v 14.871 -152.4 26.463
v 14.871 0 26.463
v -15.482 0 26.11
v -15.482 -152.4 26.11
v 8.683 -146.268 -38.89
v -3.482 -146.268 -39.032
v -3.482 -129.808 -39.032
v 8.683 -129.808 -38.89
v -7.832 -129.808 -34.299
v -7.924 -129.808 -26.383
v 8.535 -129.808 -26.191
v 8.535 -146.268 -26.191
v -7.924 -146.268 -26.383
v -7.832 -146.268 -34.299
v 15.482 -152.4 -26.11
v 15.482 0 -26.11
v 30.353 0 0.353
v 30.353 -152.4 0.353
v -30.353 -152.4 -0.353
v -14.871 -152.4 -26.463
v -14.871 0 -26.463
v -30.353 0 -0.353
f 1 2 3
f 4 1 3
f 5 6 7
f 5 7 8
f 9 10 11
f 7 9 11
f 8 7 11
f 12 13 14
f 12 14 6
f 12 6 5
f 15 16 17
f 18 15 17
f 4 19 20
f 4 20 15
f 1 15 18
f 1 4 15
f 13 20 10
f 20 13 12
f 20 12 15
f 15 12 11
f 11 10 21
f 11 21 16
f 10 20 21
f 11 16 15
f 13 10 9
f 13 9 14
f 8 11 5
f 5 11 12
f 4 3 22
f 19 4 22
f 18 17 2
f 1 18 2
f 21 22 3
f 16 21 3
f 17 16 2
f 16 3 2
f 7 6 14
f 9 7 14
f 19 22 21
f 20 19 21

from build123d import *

# Parameters (mm, degrees)
F1_DEPTH = 152.4
F2_W     = 16.4605937898
F2_H     = 16.4605937898
F3_DEPTH = 12.7
F5_DEPTH = 25.4


with BuildPart() as f1:
    # F0 (on Front) → F1 (new body)
    with BuildSketch(Plane.XZ):
        Polygon((15.4824422158, -26.1103501737), (30.3534476601, 0.3530131847), (14.8710054442, 26.4633633584), (-15.4824422158, 26.1103501737), (-30.3534476601, -0.3530131847), (-14.8710054442, -26.4633633584), align=None)
    extrude(amount=F1_DEPTH)

    # F2 (on face) → F3 (join)
    with BuildSketch(Plane(origin=(0.3057183858, 0, -26.2868567661), x_dir=(0.9999323774, 0, 0.0116292988), z_dir=(0.0116292988, 0, -0.9999323774))):
        with Locations((0, 138.0381435156)):
            Rectangle(F2_W, F2_H)
    extrude(amount=F3_DEPTH)

    # F4 (on face) → F5 (cut)
    with BuildSketch(Plane.XZ.offset(146.2684404105)):
        Polygon((-3.4819418117, -39.031766442), (-7.8319489835, -34.2993618355), (-7.7763298602, -39.0817105412), align=None)
    extrude(amount=-F5_DEPTH, mode=Mode.SUBTRACT)


solid = f1.part
